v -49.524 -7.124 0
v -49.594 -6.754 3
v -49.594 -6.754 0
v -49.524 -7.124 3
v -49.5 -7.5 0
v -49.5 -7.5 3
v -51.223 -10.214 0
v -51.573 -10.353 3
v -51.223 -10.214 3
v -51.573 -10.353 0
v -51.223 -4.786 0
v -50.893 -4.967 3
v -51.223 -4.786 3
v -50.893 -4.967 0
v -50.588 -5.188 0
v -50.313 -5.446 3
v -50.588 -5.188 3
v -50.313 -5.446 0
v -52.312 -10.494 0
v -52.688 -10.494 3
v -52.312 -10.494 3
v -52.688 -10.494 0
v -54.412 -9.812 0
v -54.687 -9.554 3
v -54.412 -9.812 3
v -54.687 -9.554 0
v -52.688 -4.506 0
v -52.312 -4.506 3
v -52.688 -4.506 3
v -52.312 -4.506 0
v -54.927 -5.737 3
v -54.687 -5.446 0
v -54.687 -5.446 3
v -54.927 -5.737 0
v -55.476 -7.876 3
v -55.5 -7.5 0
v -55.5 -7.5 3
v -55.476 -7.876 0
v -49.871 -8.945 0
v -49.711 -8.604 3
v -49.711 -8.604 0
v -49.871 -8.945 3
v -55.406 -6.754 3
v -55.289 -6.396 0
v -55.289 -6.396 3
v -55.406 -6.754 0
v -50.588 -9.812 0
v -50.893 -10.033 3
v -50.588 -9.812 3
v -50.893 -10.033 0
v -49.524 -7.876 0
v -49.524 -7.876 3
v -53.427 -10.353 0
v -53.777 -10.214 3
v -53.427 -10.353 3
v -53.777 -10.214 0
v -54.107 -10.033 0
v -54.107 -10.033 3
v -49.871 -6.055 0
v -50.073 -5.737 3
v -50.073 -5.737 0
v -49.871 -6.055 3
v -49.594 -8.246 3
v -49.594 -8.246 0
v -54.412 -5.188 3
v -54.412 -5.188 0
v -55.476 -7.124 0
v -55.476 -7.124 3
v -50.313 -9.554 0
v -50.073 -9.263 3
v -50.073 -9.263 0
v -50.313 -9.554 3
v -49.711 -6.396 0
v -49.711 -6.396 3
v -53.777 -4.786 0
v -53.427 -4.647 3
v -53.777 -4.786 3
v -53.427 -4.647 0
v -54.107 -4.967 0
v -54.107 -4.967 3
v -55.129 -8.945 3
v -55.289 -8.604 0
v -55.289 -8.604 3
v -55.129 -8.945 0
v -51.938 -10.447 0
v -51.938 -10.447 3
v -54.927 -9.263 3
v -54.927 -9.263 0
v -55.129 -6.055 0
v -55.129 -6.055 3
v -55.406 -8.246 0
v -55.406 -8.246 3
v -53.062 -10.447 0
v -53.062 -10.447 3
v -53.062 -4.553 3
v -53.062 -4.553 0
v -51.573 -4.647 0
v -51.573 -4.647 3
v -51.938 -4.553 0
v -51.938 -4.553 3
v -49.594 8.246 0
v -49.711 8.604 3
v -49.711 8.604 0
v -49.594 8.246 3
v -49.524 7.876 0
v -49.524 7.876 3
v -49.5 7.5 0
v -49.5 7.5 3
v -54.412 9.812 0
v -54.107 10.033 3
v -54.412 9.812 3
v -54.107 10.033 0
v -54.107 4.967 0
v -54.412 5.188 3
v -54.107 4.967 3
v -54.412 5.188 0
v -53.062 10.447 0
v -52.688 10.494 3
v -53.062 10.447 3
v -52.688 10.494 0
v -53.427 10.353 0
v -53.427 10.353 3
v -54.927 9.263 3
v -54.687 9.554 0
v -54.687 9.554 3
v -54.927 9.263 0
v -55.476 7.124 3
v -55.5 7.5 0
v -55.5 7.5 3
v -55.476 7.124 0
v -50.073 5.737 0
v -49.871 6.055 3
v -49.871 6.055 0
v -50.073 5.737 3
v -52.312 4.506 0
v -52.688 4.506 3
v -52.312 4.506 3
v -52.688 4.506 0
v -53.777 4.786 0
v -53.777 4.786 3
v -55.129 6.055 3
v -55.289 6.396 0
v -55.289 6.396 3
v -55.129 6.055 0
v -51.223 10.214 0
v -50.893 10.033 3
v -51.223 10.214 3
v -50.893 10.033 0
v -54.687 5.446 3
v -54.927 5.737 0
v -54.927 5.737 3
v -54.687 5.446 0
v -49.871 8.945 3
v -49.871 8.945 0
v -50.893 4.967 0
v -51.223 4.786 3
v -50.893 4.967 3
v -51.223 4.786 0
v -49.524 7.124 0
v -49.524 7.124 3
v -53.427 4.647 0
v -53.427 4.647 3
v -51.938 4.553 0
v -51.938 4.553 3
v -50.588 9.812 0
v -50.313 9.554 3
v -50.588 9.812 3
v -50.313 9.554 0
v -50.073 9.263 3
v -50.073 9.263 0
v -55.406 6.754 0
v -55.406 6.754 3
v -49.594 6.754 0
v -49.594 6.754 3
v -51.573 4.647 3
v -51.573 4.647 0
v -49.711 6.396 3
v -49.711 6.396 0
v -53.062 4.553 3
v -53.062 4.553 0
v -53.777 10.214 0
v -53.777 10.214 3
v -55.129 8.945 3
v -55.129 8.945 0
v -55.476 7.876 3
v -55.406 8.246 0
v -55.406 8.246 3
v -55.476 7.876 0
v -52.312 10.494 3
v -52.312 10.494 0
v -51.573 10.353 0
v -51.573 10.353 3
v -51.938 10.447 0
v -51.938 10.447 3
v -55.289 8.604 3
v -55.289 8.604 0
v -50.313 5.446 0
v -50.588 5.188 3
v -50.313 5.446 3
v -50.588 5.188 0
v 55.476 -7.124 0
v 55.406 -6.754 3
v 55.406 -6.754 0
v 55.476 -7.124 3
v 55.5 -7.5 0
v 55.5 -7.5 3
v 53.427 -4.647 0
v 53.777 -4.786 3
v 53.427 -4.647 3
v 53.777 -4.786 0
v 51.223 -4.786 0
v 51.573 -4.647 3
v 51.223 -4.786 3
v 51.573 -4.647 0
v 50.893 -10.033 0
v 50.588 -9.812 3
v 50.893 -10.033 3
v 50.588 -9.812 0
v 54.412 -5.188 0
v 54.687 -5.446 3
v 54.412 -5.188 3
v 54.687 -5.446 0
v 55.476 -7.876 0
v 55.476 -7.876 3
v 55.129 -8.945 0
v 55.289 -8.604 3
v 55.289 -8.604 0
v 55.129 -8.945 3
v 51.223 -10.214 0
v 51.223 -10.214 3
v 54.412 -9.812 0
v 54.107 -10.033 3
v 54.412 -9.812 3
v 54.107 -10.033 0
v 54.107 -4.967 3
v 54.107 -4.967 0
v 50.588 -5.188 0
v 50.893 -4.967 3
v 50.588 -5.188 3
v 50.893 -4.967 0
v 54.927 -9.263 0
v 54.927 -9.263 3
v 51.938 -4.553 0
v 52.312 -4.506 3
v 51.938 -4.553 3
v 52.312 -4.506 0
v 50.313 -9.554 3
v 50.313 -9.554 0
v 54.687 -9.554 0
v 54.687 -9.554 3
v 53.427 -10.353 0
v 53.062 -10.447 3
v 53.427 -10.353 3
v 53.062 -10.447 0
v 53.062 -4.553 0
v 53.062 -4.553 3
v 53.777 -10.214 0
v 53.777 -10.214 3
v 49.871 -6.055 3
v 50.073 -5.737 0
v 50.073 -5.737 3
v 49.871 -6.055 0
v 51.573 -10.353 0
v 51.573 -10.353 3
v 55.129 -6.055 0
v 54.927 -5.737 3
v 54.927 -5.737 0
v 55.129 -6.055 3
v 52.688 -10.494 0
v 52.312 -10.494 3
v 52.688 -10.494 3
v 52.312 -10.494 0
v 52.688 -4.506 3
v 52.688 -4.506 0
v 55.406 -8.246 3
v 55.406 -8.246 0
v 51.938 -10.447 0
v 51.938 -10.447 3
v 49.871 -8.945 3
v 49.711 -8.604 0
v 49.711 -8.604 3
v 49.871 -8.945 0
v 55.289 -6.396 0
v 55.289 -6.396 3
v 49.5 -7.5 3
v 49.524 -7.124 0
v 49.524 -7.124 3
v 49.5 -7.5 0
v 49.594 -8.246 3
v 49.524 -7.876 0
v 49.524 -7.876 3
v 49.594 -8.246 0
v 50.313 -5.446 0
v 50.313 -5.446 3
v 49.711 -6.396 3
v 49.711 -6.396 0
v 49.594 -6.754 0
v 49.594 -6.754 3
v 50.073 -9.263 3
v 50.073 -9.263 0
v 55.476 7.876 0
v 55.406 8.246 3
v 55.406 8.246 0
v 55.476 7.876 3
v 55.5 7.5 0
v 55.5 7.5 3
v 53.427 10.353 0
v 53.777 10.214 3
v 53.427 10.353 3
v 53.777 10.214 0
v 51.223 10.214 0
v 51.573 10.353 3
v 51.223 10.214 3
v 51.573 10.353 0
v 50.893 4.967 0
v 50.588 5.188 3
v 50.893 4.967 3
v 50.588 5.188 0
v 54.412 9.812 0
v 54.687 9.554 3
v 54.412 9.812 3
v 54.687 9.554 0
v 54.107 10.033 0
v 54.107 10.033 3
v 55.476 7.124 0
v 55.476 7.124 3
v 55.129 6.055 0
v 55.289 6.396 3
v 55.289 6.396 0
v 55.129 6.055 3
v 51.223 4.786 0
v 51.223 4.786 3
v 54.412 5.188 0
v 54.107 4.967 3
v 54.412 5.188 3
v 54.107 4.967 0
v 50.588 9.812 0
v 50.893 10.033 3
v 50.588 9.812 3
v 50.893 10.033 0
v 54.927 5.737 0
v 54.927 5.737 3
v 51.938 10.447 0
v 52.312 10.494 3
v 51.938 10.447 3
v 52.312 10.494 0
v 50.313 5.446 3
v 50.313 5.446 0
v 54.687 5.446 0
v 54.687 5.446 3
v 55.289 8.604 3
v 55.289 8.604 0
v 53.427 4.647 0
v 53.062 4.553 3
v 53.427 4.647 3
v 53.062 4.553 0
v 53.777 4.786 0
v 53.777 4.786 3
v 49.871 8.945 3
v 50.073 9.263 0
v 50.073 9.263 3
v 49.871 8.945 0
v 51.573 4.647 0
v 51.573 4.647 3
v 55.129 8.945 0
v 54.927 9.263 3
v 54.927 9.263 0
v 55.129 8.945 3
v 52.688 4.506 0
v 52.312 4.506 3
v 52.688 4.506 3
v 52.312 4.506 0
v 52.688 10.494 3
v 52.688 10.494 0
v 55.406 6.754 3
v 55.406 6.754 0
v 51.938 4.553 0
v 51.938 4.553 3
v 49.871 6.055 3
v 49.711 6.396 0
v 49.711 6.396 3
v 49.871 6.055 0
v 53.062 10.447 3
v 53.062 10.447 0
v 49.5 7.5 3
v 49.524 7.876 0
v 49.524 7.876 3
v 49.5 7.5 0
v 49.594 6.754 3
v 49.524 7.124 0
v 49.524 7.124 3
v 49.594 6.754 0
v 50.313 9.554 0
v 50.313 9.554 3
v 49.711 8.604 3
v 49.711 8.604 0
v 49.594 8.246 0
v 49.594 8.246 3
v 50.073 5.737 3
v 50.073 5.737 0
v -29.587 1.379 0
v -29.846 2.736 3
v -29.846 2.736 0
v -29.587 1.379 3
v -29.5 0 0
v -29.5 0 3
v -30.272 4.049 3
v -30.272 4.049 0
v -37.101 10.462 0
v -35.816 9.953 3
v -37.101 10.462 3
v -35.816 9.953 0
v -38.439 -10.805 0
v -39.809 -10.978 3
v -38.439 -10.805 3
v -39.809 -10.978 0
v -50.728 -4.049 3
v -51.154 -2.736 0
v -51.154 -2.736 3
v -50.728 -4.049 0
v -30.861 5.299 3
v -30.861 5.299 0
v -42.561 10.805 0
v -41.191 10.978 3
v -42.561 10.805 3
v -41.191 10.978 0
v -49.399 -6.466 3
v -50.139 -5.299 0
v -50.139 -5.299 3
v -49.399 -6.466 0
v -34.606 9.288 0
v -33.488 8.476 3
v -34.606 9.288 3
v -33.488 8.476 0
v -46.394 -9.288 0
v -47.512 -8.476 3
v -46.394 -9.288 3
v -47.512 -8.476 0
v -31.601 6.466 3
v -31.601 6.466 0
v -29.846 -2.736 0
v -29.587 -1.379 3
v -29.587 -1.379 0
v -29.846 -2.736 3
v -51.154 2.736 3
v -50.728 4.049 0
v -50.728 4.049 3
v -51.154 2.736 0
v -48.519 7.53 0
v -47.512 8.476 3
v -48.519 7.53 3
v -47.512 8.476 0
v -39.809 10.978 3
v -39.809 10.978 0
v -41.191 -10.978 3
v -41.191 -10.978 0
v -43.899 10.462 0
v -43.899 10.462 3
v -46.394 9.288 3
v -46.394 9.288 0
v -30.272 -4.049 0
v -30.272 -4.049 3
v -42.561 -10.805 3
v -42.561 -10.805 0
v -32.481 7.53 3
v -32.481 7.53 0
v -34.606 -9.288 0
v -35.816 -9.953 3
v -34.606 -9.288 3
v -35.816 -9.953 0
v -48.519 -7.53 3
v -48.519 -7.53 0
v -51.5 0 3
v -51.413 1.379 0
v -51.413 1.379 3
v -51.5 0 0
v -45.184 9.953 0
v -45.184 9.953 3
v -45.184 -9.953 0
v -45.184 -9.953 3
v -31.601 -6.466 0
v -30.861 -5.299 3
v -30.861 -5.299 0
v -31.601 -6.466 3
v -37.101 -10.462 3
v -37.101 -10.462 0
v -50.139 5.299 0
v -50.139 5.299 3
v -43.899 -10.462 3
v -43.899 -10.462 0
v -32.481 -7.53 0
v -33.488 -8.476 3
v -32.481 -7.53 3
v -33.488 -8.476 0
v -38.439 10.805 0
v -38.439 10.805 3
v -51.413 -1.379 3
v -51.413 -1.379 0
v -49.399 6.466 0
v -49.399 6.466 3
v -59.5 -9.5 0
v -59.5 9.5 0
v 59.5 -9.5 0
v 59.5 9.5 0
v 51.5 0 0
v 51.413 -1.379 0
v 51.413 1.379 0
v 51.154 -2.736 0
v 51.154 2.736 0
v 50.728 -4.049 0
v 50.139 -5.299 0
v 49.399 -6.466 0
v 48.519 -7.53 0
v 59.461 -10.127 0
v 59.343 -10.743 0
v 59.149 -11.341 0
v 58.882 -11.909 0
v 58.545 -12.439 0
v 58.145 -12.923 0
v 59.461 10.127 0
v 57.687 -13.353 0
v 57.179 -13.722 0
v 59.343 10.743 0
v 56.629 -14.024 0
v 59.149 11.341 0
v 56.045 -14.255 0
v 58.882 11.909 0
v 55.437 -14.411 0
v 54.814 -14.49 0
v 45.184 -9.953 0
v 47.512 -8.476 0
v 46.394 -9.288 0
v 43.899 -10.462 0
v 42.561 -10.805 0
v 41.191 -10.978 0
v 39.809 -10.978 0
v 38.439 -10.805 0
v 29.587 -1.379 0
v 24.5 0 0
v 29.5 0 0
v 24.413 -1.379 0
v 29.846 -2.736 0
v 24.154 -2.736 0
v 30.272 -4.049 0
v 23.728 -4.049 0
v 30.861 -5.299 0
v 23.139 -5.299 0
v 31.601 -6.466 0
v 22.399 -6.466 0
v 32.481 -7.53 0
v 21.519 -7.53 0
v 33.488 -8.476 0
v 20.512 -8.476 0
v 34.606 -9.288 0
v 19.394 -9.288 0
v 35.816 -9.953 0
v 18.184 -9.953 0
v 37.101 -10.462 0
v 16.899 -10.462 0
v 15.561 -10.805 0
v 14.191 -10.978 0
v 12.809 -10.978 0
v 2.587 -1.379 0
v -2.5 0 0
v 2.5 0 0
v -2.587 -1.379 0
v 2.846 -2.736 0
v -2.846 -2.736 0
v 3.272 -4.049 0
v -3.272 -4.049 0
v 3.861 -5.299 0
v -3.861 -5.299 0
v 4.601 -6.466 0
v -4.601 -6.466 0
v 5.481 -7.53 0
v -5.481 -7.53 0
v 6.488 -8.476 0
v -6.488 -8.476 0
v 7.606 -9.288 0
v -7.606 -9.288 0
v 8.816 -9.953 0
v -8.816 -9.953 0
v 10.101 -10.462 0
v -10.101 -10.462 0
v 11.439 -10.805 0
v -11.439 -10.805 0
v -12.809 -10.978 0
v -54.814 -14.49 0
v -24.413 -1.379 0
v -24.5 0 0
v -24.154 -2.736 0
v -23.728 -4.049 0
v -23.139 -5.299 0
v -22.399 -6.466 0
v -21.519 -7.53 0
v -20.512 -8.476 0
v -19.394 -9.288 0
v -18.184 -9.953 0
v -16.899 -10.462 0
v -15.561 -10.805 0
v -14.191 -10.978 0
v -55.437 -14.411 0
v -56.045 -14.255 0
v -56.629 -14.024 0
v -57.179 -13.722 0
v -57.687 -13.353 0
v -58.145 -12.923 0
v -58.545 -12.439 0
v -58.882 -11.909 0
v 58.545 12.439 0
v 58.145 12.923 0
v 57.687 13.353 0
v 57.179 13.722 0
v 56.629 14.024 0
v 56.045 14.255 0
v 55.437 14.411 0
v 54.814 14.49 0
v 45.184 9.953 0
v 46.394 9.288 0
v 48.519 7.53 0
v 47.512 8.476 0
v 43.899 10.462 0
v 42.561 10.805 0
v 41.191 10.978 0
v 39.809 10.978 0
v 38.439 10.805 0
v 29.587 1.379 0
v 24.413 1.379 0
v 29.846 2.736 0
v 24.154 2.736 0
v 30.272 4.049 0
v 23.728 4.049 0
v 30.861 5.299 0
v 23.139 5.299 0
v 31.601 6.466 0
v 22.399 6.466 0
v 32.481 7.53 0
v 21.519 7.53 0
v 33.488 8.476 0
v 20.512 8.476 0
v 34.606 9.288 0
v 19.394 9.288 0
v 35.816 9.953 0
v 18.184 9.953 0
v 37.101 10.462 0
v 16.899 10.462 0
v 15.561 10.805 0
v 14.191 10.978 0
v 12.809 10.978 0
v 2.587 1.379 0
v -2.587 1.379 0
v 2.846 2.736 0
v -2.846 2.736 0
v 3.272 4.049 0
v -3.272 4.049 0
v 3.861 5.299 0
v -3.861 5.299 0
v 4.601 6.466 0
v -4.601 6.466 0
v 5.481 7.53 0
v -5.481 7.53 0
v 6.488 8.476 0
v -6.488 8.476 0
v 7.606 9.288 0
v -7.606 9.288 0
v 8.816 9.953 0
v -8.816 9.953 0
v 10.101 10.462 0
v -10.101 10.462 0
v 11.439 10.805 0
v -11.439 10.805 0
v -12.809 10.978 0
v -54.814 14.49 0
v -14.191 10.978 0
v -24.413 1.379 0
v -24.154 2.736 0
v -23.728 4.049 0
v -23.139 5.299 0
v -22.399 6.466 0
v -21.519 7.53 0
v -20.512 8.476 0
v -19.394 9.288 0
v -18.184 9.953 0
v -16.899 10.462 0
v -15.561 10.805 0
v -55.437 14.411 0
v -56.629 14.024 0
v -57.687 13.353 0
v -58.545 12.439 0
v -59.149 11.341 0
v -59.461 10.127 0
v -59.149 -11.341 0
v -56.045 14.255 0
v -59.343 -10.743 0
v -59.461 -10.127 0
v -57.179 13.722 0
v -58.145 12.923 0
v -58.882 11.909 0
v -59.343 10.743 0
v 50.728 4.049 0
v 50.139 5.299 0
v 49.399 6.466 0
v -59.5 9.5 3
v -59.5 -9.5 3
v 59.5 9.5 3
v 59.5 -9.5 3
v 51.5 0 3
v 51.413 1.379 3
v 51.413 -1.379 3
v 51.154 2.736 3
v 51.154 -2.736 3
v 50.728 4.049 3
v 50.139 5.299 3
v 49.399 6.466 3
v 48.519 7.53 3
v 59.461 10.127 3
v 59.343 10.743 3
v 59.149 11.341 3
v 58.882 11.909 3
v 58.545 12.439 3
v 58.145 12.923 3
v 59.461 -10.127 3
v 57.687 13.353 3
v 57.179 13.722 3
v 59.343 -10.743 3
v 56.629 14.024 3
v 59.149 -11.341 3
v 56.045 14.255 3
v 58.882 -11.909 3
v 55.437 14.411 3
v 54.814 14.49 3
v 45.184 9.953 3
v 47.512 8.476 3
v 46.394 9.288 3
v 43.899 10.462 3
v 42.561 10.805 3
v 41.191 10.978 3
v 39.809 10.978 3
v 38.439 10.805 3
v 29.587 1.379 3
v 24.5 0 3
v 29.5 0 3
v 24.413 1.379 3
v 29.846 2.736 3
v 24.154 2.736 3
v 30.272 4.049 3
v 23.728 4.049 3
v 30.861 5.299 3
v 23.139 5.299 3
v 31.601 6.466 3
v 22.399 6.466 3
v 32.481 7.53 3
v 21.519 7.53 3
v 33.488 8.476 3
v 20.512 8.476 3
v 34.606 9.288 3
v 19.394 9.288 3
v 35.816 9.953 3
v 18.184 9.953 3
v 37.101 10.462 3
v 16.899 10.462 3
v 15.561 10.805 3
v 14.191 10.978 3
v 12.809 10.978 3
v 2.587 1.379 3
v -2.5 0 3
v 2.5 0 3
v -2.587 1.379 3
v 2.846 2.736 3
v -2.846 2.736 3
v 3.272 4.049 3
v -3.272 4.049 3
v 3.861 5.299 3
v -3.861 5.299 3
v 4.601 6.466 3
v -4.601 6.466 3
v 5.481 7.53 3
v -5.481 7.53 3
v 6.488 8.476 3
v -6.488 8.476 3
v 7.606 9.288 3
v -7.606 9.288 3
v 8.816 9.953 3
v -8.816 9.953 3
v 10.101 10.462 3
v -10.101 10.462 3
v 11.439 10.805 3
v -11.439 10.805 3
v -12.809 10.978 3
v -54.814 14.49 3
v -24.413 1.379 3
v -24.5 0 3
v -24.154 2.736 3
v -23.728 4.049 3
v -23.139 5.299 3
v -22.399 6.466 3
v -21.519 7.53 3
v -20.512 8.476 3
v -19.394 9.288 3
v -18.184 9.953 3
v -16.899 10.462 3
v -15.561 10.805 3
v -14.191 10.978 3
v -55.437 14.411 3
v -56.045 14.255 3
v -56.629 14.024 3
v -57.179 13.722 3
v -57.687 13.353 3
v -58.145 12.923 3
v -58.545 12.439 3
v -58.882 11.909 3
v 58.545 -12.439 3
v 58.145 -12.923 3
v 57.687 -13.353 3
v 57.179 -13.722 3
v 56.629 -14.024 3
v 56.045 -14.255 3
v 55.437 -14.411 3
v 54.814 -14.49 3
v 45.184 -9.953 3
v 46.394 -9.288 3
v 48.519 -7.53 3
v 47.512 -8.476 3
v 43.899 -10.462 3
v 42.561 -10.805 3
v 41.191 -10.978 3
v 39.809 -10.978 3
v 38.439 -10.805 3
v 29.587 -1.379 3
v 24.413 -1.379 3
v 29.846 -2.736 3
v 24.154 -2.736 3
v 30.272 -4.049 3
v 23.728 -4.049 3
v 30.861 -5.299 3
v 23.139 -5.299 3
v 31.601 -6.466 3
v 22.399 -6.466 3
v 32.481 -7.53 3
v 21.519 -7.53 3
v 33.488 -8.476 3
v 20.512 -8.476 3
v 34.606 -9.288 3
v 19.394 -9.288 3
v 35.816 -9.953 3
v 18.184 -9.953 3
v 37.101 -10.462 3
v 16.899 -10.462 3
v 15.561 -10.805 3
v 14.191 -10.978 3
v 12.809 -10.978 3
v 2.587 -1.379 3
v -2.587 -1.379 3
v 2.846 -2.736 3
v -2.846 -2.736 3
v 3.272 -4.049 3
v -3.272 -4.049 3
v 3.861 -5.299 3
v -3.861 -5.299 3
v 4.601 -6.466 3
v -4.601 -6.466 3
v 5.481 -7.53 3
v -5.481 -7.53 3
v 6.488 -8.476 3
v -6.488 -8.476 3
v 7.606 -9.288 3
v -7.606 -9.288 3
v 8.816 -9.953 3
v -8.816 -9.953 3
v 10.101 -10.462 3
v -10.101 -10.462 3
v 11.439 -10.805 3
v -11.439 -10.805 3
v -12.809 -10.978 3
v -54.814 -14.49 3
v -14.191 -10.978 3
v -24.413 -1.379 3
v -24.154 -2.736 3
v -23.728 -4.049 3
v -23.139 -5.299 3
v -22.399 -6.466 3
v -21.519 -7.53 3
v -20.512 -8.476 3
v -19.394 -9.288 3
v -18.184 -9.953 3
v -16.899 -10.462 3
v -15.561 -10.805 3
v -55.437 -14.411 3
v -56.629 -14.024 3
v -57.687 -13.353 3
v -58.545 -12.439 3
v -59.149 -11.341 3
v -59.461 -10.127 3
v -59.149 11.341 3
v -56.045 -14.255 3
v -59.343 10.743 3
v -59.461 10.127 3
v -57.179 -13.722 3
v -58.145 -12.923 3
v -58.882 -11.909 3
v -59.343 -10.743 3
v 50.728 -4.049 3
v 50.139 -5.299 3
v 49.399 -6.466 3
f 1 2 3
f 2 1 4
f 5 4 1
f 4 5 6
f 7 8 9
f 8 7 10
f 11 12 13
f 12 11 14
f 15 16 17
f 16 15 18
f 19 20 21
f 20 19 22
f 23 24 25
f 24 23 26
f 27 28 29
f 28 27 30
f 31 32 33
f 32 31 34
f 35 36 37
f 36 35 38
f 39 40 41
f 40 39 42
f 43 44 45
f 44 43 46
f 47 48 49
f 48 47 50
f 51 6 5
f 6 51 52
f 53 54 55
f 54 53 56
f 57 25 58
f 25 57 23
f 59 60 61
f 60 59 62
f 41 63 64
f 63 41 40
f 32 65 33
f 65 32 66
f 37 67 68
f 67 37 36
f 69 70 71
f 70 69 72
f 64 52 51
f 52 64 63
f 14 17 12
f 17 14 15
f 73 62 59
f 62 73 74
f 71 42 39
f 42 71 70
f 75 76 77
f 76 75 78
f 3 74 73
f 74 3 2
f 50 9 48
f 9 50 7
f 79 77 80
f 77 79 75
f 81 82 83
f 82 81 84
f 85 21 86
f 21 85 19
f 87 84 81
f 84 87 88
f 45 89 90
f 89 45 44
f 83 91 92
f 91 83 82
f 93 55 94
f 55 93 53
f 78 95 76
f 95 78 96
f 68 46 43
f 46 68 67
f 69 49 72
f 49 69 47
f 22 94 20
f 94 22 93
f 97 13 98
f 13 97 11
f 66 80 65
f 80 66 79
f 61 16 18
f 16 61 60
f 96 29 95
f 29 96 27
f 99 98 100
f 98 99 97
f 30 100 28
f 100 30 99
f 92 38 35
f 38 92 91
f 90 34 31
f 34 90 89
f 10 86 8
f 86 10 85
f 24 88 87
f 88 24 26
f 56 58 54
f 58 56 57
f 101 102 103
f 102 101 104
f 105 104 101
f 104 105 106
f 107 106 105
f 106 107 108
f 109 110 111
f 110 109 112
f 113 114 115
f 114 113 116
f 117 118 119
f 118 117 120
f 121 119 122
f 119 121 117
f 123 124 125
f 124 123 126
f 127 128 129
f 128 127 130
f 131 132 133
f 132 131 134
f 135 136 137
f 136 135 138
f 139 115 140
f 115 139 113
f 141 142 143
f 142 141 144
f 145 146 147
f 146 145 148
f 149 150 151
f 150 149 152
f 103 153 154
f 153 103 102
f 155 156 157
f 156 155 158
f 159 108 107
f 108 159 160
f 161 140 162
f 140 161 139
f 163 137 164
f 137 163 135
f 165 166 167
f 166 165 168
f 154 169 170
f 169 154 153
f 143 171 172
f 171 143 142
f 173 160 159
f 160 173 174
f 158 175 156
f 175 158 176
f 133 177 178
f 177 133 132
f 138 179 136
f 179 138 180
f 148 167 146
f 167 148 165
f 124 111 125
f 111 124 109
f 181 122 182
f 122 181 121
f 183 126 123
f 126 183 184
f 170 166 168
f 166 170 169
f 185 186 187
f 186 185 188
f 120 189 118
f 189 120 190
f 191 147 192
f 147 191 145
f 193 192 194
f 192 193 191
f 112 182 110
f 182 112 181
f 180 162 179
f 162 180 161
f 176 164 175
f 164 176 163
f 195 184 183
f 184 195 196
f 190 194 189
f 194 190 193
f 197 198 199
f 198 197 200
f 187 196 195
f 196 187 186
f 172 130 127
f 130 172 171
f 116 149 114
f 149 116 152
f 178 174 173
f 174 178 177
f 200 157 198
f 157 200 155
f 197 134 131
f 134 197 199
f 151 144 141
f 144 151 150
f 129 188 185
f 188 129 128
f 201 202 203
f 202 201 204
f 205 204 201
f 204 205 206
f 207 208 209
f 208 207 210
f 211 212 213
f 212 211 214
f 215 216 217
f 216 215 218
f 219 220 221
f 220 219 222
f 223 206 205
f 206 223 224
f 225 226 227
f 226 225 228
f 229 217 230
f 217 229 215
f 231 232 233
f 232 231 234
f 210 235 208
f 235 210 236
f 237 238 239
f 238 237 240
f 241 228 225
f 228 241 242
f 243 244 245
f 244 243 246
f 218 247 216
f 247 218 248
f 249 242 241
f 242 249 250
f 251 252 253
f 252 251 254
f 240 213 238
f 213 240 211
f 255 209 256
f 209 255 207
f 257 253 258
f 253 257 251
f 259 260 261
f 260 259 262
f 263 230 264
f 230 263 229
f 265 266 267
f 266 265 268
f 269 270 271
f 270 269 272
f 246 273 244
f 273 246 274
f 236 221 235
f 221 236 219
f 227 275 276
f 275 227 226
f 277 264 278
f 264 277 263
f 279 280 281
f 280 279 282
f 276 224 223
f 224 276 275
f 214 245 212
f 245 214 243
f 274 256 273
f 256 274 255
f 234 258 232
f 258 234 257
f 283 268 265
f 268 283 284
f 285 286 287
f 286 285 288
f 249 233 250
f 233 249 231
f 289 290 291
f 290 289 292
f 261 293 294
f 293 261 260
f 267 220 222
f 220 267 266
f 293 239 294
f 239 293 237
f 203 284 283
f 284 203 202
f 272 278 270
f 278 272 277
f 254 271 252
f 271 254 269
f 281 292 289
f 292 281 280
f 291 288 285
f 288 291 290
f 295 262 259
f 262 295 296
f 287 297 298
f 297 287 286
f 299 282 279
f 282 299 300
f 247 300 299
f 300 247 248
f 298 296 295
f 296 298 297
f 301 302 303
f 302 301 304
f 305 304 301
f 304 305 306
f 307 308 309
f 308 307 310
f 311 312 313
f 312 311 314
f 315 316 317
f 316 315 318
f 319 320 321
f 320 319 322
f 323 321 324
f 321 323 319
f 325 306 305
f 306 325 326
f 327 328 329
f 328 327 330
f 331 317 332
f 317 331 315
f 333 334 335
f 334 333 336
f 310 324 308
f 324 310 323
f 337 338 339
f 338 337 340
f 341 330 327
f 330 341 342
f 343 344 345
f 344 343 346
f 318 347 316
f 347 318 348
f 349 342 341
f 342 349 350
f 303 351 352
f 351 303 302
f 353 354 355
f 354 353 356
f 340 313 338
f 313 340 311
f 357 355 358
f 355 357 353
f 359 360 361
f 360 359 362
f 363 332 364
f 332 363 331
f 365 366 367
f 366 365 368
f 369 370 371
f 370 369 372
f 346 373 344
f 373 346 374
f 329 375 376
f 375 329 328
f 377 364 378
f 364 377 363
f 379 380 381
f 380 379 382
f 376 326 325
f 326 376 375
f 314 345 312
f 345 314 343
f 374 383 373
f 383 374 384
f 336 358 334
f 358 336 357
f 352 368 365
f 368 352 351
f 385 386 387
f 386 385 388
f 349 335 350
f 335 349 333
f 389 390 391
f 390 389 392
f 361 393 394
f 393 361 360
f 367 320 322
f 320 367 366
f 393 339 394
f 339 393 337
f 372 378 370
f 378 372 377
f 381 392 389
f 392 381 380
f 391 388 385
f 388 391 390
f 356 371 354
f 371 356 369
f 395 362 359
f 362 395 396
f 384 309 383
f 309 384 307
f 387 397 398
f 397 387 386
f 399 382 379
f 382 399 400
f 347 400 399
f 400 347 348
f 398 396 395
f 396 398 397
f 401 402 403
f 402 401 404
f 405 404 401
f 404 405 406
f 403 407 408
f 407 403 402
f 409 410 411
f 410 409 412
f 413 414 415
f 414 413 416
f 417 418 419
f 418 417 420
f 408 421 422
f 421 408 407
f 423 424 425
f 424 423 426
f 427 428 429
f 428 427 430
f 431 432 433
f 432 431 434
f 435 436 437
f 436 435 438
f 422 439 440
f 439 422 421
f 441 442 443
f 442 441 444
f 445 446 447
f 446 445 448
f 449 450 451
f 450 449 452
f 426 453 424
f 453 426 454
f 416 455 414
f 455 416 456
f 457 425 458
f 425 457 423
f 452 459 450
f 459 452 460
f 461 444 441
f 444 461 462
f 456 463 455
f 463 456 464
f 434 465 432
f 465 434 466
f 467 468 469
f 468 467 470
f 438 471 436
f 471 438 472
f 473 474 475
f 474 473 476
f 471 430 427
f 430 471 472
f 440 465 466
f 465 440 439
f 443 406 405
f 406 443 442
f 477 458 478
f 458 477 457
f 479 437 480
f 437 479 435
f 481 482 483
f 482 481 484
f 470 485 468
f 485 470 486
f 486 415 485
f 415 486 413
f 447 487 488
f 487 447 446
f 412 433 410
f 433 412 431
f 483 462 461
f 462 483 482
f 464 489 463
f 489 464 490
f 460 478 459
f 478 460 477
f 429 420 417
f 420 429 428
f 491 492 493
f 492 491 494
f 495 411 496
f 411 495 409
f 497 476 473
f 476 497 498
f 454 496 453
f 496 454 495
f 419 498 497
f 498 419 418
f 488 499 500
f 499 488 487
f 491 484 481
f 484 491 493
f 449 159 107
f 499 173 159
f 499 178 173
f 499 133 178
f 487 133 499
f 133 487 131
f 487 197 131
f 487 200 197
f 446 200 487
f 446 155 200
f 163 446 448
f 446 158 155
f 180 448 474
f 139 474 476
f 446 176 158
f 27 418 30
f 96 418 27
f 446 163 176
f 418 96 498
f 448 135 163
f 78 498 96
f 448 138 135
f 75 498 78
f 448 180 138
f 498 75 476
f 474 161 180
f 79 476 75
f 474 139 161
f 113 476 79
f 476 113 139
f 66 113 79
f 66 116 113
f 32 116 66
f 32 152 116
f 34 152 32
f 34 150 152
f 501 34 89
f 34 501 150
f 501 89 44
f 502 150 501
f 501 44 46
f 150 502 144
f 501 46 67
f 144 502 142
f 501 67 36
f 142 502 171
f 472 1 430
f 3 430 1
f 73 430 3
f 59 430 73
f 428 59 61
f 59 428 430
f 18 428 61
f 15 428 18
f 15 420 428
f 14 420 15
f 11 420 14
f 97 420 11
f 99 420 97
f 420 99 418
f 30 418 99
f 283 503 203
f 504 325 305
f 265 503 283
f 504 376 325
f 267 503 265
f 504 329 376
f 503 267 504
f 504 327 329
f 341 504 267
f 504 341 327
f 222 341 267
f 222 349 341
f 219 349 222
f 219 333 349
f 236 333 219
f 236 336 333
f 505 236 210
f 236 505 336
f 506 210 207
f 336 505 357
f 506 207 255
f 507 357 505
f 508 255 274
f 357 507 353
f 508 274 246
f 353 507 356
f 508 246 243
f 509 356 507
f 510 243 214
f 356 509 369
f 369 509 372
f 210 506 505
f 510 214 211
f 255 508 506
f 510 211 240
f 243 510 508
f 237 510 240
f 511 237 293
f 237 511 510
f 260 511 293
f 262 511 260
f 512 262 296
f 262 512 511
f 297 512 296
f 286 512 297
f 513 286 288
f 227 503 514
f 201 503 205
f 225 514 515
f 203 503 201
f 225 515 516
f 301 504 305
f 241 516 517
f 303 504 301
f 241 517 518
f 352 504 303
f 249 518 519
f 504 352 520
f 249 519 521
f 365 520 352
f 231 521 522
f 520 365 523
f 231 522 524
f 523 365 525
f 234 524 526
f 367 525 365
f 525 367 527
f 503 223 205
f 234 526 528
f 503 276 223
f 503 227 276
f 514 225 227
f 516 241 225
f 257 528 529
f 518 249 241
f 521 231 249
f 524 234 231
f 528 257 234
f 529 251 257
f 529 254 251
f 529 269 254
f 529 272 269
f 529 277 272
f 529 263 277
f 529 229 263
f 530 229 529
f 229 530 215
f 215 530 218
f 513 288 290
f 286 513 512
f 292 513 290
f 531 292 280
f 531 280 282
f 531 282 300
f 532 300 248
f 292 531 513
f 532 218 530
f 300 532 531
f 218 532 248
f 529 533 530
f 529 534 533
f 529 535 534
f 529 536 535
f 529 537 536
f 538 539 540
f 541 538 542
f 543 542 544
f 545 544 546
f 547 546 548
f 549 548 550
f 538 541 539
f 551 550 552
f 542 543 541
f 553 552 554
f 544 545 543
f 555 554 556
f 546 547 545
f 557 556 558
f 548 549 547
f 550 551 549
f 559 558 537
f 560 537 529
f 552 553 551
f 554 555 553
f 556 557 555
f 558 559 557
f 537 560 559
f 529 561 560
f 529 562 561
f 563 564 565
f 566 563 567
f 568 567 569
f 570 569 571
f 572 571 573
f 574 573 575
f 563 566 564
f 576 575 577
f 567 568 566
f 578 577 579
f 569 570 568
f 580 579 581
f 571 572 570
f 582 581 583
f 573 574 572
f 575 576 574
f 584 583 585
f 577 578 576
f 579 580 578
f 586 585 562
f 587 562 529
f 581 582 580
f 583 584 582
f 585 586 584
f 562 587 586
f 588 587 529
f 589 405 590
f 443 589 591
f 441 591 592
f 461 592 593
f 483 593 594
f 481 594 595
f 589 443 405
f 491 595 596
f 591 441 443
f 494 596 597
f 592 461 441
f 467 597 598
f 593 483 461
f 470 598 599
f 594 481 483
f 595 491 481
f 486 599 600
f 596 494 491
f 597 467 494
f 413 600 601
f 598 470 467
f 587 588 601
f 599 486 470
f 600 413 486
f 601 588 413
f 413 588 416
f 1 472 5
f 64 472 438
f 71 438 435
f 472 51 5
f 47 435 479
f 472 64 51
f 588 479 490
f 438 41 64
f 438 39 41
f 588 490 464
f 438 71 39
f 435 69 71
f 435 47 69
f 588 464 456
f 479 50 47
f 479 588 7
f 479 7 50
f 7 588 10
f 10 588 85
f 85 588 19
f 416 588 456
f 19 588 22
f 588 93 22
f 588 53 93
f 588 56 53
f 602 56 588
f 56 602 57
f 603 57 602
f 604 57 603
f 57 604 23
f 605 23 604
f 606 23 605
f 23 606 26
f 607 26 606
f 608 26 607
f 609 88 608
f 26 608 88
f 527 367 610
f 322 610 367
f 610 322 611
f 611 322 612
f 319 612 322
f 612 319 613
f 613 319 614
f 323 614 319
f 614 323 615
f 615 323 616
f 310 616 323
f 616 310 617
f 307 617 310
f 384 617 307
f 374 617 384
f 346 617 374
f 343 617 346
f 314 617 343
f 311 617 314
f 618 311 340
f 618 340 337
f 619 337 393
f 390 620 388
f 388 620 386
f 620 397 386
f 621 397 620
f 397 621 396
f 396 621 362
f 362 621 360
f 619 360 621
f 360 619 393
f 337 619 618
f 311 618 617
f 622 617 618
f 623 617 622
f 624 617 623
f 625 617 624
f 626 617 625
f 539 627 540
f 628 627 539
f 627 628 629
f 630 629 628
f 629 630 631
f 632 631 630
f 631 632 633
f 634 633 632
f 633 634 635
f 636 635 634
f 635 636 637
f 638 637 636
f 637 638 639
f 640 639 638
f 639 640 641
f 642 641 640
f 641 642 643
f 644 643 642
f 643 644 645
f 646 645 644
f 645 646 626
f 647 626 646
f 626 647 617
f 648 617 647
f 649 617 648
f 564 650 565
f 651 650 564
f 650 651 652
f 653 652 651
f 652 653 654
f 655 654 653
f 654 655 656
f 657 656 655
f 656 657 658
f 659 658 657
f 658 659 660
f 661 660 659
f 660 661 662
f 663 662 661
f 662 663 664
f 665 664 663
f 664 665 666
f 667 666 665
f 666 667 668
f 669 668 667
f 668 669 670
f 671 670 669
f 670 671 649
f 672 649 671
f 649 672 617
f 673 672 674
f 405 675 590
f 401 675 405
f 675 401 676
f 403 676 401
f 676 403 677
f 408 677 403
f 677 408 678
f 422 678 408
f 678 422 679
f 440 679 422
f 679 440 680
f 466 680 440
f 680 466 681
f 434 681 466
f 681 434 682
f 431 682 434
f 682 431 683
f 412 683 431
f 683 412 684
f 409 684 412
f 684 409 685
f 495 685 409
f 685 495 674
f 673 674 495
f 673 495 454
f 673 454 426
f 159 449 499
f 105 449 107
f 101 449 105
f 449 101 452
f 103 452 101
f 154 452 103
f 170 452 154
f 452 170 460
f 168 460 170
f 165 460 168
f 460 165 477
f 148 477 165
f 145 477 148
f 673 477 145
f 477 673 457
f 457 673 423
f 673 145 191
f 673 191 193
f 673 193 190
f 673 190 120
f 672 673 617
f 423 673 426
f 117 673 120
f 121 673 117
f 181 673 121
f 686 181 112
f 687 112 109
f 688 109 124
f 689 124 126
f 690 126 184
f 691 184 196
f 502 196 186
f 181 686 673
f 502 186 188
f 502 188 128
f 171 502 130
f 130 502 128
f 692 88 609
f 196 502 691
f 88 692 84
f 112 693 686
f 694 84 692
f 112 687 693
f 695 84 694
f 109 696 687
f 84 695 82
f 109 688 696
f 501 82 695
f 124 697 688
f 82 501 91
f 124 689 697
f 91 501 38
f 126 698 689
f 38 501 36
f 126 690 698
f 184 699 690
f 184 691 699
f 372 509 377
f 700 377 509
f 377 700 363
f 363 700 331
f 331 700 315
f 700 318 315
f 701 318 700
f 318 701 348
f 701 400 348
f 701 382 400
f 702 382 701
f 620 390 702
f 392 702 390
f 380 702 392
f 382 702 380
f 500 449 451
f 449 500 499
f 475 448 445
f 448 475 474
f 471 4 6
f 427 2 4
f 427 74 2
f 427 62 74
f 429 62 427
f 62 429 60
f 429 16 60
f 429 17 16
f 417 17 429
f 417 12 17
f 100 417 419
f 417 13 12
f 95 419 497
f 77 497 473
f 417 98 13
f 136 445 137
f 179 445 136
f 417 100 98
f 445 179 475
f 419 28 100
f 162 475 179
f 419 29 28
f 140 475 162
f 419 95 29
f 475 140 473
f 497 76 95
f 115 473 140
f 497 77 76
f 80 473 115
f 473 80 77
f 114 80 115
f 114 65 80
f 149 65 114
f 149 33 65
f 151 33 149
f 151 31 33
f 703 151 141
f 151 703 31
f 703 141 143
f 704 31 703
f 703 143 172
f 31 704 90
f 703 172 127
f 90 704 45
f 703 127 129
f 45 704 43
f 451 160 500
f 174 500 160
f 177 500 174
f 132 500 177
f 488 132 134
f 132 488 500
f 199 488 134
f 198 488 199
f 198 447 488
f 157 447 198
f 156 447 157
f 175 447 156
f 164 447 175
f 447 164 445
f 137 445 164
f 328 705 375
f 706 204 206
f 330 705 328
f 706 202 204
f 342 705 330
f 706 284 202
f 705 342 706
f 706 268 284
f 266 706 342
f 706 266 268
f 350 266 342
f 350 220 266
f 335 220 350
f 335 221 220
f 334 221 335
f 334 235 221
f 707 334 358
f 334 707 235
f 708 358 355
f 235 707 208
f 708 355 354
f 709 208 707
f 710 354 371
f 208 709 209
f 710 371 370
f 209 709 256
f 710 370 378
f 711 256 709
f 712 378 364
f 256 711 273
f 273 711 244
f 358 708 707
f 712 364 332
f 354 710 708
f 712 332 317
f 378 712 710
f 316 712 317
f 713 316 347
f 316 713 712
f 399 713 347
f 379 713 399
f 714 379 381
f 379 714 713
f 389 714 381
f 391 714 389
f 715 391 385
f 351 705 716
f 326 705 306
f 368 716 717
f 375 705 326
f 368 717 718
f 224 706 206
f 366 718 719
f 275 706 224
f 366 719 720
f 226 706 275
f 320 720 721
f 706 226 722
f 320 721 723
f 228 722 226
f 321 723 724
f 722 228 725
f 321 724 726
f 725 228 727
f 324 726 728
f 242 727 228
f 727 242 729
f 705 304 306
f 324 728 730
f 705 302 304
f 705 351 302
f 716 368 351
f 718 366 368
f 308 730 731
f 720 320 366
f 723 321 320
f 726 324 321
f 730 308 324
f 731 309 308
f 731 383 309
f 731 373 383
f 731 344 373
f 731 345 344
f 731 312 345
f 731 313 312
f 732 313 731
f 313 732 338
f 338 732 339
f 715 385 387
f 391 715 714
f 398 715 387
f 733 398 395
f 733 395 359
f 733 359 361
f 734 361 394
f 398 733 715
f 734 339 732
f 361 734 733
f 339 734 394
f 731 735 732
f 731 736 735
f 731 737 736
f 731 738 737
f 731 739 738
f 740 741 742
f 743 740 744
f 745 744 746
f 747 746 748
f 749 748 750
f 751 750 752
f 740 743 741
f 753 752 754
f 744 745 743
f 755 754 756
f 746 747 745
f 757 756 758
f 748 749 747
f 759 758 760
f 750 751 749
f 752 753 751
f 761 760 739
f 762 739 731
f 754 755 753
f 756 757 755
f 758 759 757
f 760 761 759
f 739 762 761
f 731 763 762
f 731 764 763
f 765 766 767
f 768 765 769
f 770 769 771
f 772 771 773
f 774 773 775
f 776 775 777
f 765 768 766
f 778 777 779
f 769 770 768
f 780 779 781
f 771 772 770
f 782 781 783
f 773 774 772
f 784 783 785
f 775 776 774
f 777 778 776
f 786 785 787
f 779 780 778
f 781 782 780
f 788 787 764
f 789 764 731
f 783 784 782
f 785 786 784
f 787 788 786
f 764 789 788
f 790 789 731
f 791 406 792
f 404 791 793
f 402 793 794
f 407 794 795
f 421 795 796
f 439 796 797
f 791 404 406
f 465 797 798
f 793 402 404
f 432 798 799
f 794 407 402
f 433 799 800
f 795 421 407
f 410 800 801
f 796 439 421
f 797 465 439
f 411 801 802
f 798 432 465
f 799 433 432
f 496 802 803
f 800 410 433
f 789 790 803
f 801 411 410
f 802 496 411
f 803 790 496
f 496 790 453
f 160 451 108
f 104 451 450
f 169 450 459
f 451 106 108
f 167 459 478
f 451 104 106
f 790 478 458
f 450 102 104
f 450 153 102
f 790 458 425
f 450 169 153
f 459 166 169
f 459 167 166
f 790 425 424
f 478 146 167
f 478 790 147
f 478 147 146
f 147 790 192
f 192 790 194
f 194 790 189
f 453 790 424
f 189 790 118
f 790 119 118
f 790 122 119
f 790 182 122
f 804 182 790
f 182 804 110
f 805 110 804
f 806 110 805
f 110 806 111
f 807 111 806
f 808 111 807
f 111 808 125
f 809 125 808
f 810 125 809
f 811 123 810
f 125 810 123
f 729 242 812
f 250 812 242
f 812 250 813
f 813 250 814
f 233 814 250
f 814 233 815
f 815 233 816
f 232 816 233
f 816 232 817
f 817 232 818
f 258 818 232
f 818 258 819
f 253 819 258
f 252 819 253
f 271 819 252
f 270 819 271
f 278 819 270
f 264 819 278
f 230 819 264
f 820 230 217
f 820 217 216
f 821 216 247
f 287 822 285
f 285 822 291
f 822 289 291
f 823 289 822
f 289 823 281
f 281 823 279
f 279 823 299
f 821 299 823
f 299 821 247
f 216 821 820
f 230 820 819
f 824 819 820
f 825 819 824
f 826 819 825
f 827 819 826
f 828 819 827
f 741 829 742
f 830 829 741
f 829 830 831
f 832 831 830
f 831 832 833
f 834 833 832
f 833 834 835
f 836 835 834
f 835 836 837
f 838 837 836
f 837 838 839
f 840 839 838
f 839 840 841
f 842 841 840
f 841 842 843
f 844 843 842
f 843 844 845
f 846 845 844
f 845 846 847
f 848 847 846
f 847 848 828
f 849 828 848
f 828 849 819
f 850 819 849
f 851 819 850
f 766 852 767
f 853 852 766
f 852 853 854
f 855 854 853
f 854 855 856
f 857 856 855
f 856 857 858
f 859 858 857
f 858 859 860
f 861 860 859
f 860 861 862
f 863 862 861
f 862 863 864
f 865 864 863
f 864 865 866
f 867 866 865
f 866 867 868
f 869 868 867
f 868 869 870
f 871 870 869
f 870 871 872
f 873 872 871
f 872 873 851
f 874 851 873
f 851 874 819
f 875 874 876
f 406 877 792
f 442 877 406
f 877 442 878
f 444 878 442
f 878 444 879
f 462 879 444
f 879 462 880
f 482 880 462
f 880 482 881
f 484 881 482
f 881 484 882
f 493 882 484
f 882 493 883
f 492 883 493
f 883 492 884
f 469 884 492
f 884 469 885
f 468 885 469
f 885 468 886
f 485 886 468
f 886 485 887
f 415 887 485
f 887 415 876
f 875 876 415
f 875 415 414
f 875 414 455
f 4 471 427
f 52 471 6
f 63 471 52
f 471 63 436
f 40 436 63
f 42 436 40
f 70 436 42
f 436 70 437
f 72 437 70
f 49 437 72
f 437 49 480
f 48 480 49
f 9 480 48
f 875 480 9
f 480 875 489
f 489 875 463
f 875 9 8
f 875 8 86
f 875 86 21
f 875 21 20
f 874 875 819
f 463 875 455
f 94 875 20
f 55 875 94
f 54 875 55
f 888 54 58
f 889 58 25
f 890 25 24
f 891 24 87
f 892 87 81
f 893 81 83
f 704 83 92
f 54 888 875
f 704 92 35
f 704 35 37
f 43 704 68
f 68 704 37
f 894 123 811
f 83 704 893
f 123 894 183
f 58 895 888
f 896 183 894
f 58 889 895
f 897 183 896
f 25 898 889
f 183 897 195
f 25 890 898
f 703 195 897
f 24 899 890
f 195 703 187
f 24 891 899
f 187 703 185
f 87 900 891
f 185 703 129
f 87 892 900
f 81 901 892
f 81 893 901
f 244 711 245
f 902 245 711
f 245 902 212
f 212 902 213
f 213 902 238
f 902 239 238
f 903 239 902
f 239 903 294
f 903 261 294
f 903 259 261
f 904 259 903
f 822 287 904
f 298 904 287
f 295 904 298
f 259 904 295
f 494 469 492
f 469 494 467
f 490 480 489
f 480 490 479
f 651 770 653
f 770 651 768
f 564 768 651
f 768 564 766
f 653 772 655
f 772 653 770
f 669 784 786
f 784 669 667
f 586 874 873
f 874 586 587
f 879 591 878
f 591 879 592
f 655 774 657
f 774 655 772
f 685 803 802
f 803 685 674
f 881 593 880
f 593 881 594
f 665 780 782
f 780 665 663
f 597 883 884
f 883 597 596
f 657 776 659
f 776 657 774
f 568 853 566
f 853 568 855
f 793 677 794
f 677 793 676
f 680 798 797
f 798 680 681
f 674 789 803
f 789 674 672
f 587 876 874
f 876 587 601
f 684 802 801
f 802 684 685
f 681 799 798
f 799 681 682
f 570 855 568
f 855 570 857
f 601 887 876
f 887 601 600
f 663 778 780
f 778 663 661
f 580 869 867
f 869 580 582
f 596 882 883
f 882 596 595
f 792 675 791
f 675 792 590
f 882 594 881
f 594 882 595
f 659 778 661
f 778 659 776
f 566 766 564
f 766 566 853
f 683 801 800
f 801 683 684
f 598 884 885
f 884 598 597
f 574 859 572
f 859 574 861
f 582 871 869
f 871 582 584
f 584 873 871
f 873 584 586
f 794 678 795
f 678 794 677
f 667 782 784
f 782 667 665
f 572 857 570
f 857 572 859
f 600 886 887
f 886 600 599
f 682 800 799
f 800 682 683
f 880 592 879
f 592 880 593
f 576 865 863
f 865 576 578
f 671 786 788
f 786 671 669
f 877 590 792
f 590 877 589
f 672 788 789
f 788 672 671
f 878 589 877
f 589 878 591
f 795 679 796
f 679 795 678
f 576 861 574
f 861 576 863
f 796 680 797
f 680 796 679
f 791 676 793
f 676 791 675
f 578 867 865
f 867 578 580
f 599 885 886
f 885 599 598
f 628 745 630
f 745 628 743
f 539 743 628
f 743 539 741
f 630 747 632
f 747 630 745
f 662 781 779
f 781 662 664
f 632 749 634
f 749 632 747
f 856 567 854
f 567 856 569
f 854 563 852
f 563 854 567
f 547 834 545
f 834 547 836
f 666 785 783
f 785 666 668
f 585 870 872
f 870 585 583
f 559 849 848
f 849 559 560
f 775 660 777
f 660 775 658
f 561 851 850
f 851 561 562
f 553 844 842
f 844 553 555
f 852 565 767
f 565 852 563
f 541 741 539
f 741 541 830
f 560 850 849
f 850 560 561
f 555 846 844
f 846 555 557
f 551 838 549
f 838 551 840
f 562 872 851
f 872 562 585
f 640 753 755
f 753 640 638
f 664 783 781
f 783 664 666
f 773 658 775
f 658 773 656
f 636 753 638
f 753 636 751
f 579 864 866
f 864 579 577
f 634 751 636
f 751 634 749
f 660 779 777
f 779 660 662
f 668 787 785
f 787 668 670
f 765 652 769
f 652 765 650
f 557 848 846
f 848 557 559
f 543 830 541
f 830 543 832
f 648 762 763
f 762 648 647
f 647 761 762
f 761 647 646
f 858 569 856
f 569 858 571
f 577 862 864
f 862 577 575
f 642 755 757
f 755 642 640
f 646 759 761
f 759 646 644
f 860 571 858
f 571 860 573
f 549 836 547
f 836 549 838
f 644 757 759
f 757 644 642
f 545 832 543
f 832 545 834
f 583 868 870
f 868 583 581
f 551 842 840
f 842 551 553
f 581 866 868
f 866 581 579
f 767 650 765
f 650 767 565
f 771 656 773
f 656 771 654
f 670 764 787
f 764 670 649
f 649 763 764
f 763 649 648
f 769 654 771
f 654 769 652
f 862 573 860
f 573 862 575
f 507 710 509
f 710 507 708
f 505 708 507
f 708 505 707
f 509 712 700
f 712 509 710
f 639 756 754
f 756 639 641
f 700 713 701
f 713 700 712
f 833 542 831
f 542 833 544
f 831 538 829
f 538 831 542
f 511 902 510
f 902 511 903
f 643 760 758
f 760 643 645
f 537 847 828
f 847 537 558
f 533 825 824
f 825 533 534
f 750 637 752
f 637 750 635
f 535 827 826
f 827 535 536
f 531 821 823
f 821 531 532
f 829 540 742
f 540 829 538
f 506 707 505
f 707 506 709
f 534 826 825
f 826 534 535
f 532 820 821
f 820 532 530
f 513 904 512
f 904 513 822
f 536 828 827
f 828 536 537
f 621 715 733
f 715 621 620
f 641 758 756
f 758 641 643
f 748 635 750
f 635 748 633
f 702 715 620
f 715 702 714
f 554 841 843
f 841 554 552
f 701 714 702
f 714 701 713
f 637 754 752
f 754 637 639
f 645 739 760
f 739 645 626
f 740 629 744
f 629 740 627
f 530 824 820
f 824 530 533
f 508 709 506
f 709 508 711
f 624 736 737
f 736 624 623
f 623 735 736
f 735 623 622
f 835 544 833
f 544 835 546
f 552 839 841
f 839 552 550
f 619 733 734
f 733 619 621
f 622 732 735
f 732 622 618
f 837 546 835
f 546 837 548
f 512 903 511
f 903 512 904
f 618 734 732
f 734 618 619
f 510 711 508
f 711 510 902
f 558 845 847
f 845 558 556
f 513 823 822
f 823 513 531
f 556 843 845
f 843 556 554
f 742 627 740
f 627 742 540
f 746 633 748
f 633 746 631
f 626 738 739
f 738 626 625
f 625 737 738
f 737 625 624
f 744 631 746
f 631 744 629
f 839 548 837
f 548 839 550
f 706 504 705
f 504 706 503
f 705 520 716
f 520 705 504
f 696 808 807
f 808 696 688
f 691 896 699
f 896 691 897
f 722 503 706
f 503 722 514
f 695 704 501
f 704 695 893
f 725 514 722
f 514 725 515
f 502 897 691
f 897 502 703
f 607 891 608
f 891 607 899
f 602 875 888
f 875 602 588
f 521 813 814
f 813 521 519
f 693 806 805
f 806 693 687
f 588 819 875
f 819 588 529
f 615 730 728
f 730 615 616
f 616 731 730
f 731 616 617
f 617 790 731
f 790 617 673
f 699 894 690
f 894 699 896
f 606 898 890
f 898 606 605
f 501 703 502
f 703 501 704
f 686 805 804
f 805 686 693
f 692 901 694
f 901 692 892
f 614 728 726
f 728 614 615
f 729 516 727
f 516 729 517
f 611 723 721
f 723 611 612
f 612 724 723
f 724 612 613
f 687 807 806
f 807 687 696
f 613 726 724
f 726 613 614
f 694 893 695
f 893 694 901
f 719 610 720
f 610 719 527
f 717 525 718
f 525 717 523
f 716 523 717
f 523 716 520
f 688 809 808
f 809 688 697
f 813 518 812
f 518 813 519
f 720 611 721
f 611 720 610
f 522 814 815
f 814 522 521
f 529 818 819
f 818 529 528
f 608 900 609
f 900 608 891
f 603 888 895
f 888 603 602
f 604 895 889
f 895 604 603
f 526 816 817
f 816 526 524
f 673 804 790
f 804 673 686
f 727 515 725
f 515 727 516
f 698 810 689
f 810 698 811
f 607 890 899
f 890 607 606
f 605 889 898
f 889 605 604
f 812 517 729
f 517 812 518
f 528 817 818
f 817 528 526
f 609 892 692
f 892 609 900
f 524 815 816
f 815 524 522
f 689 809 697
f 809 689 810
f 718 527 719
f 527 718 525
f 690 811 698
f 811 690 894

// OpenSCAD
$fn = 50;


difference() {
	union() {
		hull() {
			translate(v = [-54.5000000000, 9.5000000000, 0]) {
				cylinder(h = 3, r = 5);
			}
			translate(v = [54.5000000000, 9.5000000000, 0]) {
				cylinder(h = 3, r = 5);
			}
			translate(v = [-54.5000000000, -9.5000000000, 0]) {
				cylinder(h = 3, r = 5);
			}
			translate(v = [54.5000000000, -9.5000000000, 0]) {
				cylinder(h = 3, r = 5);
			}
		}
	}
	union() {
		#translate(v = [-52.5000000000, -7.5000000000, -100.0000000000]) {
			cylinder(h = 200, r = 3.0000000000);
		}
		#translate(v = [-52.5000000000, 7.5000000000, -100.0000000000]) {
			cylinder(h = 200, r = 3.0000000000);
		}
		#translate(v = [52.5000000000, -7.5000000000, -100.0000000000]) {
			cylinder(h = 200, r = 3.0000000000);
		}
		#translate(v = [52.5000000000, 7.5000000000, -100.0000000000]) {
			cylinder(h = 200, r = 3.0000000000);
		}
		#translate(v = [-40.5000000000, 0, 0]) {
			cylinder(h = 3, r = 11.0000000000);
		}
		#translate(v = [-13.5000000000, 0, 0]) {
			cylinder(h = 3, r = 11.0000000000);
		}
		#translate(v = [13.5000000000, 0, 0]) {
			cylinder(h = 3, r = 11.0000000000);
		}
		#translate(v = [40.5000000000, 0, 0]) {
			cylinder(h = 3, r = 11.0000000000);
		}
	}
}
